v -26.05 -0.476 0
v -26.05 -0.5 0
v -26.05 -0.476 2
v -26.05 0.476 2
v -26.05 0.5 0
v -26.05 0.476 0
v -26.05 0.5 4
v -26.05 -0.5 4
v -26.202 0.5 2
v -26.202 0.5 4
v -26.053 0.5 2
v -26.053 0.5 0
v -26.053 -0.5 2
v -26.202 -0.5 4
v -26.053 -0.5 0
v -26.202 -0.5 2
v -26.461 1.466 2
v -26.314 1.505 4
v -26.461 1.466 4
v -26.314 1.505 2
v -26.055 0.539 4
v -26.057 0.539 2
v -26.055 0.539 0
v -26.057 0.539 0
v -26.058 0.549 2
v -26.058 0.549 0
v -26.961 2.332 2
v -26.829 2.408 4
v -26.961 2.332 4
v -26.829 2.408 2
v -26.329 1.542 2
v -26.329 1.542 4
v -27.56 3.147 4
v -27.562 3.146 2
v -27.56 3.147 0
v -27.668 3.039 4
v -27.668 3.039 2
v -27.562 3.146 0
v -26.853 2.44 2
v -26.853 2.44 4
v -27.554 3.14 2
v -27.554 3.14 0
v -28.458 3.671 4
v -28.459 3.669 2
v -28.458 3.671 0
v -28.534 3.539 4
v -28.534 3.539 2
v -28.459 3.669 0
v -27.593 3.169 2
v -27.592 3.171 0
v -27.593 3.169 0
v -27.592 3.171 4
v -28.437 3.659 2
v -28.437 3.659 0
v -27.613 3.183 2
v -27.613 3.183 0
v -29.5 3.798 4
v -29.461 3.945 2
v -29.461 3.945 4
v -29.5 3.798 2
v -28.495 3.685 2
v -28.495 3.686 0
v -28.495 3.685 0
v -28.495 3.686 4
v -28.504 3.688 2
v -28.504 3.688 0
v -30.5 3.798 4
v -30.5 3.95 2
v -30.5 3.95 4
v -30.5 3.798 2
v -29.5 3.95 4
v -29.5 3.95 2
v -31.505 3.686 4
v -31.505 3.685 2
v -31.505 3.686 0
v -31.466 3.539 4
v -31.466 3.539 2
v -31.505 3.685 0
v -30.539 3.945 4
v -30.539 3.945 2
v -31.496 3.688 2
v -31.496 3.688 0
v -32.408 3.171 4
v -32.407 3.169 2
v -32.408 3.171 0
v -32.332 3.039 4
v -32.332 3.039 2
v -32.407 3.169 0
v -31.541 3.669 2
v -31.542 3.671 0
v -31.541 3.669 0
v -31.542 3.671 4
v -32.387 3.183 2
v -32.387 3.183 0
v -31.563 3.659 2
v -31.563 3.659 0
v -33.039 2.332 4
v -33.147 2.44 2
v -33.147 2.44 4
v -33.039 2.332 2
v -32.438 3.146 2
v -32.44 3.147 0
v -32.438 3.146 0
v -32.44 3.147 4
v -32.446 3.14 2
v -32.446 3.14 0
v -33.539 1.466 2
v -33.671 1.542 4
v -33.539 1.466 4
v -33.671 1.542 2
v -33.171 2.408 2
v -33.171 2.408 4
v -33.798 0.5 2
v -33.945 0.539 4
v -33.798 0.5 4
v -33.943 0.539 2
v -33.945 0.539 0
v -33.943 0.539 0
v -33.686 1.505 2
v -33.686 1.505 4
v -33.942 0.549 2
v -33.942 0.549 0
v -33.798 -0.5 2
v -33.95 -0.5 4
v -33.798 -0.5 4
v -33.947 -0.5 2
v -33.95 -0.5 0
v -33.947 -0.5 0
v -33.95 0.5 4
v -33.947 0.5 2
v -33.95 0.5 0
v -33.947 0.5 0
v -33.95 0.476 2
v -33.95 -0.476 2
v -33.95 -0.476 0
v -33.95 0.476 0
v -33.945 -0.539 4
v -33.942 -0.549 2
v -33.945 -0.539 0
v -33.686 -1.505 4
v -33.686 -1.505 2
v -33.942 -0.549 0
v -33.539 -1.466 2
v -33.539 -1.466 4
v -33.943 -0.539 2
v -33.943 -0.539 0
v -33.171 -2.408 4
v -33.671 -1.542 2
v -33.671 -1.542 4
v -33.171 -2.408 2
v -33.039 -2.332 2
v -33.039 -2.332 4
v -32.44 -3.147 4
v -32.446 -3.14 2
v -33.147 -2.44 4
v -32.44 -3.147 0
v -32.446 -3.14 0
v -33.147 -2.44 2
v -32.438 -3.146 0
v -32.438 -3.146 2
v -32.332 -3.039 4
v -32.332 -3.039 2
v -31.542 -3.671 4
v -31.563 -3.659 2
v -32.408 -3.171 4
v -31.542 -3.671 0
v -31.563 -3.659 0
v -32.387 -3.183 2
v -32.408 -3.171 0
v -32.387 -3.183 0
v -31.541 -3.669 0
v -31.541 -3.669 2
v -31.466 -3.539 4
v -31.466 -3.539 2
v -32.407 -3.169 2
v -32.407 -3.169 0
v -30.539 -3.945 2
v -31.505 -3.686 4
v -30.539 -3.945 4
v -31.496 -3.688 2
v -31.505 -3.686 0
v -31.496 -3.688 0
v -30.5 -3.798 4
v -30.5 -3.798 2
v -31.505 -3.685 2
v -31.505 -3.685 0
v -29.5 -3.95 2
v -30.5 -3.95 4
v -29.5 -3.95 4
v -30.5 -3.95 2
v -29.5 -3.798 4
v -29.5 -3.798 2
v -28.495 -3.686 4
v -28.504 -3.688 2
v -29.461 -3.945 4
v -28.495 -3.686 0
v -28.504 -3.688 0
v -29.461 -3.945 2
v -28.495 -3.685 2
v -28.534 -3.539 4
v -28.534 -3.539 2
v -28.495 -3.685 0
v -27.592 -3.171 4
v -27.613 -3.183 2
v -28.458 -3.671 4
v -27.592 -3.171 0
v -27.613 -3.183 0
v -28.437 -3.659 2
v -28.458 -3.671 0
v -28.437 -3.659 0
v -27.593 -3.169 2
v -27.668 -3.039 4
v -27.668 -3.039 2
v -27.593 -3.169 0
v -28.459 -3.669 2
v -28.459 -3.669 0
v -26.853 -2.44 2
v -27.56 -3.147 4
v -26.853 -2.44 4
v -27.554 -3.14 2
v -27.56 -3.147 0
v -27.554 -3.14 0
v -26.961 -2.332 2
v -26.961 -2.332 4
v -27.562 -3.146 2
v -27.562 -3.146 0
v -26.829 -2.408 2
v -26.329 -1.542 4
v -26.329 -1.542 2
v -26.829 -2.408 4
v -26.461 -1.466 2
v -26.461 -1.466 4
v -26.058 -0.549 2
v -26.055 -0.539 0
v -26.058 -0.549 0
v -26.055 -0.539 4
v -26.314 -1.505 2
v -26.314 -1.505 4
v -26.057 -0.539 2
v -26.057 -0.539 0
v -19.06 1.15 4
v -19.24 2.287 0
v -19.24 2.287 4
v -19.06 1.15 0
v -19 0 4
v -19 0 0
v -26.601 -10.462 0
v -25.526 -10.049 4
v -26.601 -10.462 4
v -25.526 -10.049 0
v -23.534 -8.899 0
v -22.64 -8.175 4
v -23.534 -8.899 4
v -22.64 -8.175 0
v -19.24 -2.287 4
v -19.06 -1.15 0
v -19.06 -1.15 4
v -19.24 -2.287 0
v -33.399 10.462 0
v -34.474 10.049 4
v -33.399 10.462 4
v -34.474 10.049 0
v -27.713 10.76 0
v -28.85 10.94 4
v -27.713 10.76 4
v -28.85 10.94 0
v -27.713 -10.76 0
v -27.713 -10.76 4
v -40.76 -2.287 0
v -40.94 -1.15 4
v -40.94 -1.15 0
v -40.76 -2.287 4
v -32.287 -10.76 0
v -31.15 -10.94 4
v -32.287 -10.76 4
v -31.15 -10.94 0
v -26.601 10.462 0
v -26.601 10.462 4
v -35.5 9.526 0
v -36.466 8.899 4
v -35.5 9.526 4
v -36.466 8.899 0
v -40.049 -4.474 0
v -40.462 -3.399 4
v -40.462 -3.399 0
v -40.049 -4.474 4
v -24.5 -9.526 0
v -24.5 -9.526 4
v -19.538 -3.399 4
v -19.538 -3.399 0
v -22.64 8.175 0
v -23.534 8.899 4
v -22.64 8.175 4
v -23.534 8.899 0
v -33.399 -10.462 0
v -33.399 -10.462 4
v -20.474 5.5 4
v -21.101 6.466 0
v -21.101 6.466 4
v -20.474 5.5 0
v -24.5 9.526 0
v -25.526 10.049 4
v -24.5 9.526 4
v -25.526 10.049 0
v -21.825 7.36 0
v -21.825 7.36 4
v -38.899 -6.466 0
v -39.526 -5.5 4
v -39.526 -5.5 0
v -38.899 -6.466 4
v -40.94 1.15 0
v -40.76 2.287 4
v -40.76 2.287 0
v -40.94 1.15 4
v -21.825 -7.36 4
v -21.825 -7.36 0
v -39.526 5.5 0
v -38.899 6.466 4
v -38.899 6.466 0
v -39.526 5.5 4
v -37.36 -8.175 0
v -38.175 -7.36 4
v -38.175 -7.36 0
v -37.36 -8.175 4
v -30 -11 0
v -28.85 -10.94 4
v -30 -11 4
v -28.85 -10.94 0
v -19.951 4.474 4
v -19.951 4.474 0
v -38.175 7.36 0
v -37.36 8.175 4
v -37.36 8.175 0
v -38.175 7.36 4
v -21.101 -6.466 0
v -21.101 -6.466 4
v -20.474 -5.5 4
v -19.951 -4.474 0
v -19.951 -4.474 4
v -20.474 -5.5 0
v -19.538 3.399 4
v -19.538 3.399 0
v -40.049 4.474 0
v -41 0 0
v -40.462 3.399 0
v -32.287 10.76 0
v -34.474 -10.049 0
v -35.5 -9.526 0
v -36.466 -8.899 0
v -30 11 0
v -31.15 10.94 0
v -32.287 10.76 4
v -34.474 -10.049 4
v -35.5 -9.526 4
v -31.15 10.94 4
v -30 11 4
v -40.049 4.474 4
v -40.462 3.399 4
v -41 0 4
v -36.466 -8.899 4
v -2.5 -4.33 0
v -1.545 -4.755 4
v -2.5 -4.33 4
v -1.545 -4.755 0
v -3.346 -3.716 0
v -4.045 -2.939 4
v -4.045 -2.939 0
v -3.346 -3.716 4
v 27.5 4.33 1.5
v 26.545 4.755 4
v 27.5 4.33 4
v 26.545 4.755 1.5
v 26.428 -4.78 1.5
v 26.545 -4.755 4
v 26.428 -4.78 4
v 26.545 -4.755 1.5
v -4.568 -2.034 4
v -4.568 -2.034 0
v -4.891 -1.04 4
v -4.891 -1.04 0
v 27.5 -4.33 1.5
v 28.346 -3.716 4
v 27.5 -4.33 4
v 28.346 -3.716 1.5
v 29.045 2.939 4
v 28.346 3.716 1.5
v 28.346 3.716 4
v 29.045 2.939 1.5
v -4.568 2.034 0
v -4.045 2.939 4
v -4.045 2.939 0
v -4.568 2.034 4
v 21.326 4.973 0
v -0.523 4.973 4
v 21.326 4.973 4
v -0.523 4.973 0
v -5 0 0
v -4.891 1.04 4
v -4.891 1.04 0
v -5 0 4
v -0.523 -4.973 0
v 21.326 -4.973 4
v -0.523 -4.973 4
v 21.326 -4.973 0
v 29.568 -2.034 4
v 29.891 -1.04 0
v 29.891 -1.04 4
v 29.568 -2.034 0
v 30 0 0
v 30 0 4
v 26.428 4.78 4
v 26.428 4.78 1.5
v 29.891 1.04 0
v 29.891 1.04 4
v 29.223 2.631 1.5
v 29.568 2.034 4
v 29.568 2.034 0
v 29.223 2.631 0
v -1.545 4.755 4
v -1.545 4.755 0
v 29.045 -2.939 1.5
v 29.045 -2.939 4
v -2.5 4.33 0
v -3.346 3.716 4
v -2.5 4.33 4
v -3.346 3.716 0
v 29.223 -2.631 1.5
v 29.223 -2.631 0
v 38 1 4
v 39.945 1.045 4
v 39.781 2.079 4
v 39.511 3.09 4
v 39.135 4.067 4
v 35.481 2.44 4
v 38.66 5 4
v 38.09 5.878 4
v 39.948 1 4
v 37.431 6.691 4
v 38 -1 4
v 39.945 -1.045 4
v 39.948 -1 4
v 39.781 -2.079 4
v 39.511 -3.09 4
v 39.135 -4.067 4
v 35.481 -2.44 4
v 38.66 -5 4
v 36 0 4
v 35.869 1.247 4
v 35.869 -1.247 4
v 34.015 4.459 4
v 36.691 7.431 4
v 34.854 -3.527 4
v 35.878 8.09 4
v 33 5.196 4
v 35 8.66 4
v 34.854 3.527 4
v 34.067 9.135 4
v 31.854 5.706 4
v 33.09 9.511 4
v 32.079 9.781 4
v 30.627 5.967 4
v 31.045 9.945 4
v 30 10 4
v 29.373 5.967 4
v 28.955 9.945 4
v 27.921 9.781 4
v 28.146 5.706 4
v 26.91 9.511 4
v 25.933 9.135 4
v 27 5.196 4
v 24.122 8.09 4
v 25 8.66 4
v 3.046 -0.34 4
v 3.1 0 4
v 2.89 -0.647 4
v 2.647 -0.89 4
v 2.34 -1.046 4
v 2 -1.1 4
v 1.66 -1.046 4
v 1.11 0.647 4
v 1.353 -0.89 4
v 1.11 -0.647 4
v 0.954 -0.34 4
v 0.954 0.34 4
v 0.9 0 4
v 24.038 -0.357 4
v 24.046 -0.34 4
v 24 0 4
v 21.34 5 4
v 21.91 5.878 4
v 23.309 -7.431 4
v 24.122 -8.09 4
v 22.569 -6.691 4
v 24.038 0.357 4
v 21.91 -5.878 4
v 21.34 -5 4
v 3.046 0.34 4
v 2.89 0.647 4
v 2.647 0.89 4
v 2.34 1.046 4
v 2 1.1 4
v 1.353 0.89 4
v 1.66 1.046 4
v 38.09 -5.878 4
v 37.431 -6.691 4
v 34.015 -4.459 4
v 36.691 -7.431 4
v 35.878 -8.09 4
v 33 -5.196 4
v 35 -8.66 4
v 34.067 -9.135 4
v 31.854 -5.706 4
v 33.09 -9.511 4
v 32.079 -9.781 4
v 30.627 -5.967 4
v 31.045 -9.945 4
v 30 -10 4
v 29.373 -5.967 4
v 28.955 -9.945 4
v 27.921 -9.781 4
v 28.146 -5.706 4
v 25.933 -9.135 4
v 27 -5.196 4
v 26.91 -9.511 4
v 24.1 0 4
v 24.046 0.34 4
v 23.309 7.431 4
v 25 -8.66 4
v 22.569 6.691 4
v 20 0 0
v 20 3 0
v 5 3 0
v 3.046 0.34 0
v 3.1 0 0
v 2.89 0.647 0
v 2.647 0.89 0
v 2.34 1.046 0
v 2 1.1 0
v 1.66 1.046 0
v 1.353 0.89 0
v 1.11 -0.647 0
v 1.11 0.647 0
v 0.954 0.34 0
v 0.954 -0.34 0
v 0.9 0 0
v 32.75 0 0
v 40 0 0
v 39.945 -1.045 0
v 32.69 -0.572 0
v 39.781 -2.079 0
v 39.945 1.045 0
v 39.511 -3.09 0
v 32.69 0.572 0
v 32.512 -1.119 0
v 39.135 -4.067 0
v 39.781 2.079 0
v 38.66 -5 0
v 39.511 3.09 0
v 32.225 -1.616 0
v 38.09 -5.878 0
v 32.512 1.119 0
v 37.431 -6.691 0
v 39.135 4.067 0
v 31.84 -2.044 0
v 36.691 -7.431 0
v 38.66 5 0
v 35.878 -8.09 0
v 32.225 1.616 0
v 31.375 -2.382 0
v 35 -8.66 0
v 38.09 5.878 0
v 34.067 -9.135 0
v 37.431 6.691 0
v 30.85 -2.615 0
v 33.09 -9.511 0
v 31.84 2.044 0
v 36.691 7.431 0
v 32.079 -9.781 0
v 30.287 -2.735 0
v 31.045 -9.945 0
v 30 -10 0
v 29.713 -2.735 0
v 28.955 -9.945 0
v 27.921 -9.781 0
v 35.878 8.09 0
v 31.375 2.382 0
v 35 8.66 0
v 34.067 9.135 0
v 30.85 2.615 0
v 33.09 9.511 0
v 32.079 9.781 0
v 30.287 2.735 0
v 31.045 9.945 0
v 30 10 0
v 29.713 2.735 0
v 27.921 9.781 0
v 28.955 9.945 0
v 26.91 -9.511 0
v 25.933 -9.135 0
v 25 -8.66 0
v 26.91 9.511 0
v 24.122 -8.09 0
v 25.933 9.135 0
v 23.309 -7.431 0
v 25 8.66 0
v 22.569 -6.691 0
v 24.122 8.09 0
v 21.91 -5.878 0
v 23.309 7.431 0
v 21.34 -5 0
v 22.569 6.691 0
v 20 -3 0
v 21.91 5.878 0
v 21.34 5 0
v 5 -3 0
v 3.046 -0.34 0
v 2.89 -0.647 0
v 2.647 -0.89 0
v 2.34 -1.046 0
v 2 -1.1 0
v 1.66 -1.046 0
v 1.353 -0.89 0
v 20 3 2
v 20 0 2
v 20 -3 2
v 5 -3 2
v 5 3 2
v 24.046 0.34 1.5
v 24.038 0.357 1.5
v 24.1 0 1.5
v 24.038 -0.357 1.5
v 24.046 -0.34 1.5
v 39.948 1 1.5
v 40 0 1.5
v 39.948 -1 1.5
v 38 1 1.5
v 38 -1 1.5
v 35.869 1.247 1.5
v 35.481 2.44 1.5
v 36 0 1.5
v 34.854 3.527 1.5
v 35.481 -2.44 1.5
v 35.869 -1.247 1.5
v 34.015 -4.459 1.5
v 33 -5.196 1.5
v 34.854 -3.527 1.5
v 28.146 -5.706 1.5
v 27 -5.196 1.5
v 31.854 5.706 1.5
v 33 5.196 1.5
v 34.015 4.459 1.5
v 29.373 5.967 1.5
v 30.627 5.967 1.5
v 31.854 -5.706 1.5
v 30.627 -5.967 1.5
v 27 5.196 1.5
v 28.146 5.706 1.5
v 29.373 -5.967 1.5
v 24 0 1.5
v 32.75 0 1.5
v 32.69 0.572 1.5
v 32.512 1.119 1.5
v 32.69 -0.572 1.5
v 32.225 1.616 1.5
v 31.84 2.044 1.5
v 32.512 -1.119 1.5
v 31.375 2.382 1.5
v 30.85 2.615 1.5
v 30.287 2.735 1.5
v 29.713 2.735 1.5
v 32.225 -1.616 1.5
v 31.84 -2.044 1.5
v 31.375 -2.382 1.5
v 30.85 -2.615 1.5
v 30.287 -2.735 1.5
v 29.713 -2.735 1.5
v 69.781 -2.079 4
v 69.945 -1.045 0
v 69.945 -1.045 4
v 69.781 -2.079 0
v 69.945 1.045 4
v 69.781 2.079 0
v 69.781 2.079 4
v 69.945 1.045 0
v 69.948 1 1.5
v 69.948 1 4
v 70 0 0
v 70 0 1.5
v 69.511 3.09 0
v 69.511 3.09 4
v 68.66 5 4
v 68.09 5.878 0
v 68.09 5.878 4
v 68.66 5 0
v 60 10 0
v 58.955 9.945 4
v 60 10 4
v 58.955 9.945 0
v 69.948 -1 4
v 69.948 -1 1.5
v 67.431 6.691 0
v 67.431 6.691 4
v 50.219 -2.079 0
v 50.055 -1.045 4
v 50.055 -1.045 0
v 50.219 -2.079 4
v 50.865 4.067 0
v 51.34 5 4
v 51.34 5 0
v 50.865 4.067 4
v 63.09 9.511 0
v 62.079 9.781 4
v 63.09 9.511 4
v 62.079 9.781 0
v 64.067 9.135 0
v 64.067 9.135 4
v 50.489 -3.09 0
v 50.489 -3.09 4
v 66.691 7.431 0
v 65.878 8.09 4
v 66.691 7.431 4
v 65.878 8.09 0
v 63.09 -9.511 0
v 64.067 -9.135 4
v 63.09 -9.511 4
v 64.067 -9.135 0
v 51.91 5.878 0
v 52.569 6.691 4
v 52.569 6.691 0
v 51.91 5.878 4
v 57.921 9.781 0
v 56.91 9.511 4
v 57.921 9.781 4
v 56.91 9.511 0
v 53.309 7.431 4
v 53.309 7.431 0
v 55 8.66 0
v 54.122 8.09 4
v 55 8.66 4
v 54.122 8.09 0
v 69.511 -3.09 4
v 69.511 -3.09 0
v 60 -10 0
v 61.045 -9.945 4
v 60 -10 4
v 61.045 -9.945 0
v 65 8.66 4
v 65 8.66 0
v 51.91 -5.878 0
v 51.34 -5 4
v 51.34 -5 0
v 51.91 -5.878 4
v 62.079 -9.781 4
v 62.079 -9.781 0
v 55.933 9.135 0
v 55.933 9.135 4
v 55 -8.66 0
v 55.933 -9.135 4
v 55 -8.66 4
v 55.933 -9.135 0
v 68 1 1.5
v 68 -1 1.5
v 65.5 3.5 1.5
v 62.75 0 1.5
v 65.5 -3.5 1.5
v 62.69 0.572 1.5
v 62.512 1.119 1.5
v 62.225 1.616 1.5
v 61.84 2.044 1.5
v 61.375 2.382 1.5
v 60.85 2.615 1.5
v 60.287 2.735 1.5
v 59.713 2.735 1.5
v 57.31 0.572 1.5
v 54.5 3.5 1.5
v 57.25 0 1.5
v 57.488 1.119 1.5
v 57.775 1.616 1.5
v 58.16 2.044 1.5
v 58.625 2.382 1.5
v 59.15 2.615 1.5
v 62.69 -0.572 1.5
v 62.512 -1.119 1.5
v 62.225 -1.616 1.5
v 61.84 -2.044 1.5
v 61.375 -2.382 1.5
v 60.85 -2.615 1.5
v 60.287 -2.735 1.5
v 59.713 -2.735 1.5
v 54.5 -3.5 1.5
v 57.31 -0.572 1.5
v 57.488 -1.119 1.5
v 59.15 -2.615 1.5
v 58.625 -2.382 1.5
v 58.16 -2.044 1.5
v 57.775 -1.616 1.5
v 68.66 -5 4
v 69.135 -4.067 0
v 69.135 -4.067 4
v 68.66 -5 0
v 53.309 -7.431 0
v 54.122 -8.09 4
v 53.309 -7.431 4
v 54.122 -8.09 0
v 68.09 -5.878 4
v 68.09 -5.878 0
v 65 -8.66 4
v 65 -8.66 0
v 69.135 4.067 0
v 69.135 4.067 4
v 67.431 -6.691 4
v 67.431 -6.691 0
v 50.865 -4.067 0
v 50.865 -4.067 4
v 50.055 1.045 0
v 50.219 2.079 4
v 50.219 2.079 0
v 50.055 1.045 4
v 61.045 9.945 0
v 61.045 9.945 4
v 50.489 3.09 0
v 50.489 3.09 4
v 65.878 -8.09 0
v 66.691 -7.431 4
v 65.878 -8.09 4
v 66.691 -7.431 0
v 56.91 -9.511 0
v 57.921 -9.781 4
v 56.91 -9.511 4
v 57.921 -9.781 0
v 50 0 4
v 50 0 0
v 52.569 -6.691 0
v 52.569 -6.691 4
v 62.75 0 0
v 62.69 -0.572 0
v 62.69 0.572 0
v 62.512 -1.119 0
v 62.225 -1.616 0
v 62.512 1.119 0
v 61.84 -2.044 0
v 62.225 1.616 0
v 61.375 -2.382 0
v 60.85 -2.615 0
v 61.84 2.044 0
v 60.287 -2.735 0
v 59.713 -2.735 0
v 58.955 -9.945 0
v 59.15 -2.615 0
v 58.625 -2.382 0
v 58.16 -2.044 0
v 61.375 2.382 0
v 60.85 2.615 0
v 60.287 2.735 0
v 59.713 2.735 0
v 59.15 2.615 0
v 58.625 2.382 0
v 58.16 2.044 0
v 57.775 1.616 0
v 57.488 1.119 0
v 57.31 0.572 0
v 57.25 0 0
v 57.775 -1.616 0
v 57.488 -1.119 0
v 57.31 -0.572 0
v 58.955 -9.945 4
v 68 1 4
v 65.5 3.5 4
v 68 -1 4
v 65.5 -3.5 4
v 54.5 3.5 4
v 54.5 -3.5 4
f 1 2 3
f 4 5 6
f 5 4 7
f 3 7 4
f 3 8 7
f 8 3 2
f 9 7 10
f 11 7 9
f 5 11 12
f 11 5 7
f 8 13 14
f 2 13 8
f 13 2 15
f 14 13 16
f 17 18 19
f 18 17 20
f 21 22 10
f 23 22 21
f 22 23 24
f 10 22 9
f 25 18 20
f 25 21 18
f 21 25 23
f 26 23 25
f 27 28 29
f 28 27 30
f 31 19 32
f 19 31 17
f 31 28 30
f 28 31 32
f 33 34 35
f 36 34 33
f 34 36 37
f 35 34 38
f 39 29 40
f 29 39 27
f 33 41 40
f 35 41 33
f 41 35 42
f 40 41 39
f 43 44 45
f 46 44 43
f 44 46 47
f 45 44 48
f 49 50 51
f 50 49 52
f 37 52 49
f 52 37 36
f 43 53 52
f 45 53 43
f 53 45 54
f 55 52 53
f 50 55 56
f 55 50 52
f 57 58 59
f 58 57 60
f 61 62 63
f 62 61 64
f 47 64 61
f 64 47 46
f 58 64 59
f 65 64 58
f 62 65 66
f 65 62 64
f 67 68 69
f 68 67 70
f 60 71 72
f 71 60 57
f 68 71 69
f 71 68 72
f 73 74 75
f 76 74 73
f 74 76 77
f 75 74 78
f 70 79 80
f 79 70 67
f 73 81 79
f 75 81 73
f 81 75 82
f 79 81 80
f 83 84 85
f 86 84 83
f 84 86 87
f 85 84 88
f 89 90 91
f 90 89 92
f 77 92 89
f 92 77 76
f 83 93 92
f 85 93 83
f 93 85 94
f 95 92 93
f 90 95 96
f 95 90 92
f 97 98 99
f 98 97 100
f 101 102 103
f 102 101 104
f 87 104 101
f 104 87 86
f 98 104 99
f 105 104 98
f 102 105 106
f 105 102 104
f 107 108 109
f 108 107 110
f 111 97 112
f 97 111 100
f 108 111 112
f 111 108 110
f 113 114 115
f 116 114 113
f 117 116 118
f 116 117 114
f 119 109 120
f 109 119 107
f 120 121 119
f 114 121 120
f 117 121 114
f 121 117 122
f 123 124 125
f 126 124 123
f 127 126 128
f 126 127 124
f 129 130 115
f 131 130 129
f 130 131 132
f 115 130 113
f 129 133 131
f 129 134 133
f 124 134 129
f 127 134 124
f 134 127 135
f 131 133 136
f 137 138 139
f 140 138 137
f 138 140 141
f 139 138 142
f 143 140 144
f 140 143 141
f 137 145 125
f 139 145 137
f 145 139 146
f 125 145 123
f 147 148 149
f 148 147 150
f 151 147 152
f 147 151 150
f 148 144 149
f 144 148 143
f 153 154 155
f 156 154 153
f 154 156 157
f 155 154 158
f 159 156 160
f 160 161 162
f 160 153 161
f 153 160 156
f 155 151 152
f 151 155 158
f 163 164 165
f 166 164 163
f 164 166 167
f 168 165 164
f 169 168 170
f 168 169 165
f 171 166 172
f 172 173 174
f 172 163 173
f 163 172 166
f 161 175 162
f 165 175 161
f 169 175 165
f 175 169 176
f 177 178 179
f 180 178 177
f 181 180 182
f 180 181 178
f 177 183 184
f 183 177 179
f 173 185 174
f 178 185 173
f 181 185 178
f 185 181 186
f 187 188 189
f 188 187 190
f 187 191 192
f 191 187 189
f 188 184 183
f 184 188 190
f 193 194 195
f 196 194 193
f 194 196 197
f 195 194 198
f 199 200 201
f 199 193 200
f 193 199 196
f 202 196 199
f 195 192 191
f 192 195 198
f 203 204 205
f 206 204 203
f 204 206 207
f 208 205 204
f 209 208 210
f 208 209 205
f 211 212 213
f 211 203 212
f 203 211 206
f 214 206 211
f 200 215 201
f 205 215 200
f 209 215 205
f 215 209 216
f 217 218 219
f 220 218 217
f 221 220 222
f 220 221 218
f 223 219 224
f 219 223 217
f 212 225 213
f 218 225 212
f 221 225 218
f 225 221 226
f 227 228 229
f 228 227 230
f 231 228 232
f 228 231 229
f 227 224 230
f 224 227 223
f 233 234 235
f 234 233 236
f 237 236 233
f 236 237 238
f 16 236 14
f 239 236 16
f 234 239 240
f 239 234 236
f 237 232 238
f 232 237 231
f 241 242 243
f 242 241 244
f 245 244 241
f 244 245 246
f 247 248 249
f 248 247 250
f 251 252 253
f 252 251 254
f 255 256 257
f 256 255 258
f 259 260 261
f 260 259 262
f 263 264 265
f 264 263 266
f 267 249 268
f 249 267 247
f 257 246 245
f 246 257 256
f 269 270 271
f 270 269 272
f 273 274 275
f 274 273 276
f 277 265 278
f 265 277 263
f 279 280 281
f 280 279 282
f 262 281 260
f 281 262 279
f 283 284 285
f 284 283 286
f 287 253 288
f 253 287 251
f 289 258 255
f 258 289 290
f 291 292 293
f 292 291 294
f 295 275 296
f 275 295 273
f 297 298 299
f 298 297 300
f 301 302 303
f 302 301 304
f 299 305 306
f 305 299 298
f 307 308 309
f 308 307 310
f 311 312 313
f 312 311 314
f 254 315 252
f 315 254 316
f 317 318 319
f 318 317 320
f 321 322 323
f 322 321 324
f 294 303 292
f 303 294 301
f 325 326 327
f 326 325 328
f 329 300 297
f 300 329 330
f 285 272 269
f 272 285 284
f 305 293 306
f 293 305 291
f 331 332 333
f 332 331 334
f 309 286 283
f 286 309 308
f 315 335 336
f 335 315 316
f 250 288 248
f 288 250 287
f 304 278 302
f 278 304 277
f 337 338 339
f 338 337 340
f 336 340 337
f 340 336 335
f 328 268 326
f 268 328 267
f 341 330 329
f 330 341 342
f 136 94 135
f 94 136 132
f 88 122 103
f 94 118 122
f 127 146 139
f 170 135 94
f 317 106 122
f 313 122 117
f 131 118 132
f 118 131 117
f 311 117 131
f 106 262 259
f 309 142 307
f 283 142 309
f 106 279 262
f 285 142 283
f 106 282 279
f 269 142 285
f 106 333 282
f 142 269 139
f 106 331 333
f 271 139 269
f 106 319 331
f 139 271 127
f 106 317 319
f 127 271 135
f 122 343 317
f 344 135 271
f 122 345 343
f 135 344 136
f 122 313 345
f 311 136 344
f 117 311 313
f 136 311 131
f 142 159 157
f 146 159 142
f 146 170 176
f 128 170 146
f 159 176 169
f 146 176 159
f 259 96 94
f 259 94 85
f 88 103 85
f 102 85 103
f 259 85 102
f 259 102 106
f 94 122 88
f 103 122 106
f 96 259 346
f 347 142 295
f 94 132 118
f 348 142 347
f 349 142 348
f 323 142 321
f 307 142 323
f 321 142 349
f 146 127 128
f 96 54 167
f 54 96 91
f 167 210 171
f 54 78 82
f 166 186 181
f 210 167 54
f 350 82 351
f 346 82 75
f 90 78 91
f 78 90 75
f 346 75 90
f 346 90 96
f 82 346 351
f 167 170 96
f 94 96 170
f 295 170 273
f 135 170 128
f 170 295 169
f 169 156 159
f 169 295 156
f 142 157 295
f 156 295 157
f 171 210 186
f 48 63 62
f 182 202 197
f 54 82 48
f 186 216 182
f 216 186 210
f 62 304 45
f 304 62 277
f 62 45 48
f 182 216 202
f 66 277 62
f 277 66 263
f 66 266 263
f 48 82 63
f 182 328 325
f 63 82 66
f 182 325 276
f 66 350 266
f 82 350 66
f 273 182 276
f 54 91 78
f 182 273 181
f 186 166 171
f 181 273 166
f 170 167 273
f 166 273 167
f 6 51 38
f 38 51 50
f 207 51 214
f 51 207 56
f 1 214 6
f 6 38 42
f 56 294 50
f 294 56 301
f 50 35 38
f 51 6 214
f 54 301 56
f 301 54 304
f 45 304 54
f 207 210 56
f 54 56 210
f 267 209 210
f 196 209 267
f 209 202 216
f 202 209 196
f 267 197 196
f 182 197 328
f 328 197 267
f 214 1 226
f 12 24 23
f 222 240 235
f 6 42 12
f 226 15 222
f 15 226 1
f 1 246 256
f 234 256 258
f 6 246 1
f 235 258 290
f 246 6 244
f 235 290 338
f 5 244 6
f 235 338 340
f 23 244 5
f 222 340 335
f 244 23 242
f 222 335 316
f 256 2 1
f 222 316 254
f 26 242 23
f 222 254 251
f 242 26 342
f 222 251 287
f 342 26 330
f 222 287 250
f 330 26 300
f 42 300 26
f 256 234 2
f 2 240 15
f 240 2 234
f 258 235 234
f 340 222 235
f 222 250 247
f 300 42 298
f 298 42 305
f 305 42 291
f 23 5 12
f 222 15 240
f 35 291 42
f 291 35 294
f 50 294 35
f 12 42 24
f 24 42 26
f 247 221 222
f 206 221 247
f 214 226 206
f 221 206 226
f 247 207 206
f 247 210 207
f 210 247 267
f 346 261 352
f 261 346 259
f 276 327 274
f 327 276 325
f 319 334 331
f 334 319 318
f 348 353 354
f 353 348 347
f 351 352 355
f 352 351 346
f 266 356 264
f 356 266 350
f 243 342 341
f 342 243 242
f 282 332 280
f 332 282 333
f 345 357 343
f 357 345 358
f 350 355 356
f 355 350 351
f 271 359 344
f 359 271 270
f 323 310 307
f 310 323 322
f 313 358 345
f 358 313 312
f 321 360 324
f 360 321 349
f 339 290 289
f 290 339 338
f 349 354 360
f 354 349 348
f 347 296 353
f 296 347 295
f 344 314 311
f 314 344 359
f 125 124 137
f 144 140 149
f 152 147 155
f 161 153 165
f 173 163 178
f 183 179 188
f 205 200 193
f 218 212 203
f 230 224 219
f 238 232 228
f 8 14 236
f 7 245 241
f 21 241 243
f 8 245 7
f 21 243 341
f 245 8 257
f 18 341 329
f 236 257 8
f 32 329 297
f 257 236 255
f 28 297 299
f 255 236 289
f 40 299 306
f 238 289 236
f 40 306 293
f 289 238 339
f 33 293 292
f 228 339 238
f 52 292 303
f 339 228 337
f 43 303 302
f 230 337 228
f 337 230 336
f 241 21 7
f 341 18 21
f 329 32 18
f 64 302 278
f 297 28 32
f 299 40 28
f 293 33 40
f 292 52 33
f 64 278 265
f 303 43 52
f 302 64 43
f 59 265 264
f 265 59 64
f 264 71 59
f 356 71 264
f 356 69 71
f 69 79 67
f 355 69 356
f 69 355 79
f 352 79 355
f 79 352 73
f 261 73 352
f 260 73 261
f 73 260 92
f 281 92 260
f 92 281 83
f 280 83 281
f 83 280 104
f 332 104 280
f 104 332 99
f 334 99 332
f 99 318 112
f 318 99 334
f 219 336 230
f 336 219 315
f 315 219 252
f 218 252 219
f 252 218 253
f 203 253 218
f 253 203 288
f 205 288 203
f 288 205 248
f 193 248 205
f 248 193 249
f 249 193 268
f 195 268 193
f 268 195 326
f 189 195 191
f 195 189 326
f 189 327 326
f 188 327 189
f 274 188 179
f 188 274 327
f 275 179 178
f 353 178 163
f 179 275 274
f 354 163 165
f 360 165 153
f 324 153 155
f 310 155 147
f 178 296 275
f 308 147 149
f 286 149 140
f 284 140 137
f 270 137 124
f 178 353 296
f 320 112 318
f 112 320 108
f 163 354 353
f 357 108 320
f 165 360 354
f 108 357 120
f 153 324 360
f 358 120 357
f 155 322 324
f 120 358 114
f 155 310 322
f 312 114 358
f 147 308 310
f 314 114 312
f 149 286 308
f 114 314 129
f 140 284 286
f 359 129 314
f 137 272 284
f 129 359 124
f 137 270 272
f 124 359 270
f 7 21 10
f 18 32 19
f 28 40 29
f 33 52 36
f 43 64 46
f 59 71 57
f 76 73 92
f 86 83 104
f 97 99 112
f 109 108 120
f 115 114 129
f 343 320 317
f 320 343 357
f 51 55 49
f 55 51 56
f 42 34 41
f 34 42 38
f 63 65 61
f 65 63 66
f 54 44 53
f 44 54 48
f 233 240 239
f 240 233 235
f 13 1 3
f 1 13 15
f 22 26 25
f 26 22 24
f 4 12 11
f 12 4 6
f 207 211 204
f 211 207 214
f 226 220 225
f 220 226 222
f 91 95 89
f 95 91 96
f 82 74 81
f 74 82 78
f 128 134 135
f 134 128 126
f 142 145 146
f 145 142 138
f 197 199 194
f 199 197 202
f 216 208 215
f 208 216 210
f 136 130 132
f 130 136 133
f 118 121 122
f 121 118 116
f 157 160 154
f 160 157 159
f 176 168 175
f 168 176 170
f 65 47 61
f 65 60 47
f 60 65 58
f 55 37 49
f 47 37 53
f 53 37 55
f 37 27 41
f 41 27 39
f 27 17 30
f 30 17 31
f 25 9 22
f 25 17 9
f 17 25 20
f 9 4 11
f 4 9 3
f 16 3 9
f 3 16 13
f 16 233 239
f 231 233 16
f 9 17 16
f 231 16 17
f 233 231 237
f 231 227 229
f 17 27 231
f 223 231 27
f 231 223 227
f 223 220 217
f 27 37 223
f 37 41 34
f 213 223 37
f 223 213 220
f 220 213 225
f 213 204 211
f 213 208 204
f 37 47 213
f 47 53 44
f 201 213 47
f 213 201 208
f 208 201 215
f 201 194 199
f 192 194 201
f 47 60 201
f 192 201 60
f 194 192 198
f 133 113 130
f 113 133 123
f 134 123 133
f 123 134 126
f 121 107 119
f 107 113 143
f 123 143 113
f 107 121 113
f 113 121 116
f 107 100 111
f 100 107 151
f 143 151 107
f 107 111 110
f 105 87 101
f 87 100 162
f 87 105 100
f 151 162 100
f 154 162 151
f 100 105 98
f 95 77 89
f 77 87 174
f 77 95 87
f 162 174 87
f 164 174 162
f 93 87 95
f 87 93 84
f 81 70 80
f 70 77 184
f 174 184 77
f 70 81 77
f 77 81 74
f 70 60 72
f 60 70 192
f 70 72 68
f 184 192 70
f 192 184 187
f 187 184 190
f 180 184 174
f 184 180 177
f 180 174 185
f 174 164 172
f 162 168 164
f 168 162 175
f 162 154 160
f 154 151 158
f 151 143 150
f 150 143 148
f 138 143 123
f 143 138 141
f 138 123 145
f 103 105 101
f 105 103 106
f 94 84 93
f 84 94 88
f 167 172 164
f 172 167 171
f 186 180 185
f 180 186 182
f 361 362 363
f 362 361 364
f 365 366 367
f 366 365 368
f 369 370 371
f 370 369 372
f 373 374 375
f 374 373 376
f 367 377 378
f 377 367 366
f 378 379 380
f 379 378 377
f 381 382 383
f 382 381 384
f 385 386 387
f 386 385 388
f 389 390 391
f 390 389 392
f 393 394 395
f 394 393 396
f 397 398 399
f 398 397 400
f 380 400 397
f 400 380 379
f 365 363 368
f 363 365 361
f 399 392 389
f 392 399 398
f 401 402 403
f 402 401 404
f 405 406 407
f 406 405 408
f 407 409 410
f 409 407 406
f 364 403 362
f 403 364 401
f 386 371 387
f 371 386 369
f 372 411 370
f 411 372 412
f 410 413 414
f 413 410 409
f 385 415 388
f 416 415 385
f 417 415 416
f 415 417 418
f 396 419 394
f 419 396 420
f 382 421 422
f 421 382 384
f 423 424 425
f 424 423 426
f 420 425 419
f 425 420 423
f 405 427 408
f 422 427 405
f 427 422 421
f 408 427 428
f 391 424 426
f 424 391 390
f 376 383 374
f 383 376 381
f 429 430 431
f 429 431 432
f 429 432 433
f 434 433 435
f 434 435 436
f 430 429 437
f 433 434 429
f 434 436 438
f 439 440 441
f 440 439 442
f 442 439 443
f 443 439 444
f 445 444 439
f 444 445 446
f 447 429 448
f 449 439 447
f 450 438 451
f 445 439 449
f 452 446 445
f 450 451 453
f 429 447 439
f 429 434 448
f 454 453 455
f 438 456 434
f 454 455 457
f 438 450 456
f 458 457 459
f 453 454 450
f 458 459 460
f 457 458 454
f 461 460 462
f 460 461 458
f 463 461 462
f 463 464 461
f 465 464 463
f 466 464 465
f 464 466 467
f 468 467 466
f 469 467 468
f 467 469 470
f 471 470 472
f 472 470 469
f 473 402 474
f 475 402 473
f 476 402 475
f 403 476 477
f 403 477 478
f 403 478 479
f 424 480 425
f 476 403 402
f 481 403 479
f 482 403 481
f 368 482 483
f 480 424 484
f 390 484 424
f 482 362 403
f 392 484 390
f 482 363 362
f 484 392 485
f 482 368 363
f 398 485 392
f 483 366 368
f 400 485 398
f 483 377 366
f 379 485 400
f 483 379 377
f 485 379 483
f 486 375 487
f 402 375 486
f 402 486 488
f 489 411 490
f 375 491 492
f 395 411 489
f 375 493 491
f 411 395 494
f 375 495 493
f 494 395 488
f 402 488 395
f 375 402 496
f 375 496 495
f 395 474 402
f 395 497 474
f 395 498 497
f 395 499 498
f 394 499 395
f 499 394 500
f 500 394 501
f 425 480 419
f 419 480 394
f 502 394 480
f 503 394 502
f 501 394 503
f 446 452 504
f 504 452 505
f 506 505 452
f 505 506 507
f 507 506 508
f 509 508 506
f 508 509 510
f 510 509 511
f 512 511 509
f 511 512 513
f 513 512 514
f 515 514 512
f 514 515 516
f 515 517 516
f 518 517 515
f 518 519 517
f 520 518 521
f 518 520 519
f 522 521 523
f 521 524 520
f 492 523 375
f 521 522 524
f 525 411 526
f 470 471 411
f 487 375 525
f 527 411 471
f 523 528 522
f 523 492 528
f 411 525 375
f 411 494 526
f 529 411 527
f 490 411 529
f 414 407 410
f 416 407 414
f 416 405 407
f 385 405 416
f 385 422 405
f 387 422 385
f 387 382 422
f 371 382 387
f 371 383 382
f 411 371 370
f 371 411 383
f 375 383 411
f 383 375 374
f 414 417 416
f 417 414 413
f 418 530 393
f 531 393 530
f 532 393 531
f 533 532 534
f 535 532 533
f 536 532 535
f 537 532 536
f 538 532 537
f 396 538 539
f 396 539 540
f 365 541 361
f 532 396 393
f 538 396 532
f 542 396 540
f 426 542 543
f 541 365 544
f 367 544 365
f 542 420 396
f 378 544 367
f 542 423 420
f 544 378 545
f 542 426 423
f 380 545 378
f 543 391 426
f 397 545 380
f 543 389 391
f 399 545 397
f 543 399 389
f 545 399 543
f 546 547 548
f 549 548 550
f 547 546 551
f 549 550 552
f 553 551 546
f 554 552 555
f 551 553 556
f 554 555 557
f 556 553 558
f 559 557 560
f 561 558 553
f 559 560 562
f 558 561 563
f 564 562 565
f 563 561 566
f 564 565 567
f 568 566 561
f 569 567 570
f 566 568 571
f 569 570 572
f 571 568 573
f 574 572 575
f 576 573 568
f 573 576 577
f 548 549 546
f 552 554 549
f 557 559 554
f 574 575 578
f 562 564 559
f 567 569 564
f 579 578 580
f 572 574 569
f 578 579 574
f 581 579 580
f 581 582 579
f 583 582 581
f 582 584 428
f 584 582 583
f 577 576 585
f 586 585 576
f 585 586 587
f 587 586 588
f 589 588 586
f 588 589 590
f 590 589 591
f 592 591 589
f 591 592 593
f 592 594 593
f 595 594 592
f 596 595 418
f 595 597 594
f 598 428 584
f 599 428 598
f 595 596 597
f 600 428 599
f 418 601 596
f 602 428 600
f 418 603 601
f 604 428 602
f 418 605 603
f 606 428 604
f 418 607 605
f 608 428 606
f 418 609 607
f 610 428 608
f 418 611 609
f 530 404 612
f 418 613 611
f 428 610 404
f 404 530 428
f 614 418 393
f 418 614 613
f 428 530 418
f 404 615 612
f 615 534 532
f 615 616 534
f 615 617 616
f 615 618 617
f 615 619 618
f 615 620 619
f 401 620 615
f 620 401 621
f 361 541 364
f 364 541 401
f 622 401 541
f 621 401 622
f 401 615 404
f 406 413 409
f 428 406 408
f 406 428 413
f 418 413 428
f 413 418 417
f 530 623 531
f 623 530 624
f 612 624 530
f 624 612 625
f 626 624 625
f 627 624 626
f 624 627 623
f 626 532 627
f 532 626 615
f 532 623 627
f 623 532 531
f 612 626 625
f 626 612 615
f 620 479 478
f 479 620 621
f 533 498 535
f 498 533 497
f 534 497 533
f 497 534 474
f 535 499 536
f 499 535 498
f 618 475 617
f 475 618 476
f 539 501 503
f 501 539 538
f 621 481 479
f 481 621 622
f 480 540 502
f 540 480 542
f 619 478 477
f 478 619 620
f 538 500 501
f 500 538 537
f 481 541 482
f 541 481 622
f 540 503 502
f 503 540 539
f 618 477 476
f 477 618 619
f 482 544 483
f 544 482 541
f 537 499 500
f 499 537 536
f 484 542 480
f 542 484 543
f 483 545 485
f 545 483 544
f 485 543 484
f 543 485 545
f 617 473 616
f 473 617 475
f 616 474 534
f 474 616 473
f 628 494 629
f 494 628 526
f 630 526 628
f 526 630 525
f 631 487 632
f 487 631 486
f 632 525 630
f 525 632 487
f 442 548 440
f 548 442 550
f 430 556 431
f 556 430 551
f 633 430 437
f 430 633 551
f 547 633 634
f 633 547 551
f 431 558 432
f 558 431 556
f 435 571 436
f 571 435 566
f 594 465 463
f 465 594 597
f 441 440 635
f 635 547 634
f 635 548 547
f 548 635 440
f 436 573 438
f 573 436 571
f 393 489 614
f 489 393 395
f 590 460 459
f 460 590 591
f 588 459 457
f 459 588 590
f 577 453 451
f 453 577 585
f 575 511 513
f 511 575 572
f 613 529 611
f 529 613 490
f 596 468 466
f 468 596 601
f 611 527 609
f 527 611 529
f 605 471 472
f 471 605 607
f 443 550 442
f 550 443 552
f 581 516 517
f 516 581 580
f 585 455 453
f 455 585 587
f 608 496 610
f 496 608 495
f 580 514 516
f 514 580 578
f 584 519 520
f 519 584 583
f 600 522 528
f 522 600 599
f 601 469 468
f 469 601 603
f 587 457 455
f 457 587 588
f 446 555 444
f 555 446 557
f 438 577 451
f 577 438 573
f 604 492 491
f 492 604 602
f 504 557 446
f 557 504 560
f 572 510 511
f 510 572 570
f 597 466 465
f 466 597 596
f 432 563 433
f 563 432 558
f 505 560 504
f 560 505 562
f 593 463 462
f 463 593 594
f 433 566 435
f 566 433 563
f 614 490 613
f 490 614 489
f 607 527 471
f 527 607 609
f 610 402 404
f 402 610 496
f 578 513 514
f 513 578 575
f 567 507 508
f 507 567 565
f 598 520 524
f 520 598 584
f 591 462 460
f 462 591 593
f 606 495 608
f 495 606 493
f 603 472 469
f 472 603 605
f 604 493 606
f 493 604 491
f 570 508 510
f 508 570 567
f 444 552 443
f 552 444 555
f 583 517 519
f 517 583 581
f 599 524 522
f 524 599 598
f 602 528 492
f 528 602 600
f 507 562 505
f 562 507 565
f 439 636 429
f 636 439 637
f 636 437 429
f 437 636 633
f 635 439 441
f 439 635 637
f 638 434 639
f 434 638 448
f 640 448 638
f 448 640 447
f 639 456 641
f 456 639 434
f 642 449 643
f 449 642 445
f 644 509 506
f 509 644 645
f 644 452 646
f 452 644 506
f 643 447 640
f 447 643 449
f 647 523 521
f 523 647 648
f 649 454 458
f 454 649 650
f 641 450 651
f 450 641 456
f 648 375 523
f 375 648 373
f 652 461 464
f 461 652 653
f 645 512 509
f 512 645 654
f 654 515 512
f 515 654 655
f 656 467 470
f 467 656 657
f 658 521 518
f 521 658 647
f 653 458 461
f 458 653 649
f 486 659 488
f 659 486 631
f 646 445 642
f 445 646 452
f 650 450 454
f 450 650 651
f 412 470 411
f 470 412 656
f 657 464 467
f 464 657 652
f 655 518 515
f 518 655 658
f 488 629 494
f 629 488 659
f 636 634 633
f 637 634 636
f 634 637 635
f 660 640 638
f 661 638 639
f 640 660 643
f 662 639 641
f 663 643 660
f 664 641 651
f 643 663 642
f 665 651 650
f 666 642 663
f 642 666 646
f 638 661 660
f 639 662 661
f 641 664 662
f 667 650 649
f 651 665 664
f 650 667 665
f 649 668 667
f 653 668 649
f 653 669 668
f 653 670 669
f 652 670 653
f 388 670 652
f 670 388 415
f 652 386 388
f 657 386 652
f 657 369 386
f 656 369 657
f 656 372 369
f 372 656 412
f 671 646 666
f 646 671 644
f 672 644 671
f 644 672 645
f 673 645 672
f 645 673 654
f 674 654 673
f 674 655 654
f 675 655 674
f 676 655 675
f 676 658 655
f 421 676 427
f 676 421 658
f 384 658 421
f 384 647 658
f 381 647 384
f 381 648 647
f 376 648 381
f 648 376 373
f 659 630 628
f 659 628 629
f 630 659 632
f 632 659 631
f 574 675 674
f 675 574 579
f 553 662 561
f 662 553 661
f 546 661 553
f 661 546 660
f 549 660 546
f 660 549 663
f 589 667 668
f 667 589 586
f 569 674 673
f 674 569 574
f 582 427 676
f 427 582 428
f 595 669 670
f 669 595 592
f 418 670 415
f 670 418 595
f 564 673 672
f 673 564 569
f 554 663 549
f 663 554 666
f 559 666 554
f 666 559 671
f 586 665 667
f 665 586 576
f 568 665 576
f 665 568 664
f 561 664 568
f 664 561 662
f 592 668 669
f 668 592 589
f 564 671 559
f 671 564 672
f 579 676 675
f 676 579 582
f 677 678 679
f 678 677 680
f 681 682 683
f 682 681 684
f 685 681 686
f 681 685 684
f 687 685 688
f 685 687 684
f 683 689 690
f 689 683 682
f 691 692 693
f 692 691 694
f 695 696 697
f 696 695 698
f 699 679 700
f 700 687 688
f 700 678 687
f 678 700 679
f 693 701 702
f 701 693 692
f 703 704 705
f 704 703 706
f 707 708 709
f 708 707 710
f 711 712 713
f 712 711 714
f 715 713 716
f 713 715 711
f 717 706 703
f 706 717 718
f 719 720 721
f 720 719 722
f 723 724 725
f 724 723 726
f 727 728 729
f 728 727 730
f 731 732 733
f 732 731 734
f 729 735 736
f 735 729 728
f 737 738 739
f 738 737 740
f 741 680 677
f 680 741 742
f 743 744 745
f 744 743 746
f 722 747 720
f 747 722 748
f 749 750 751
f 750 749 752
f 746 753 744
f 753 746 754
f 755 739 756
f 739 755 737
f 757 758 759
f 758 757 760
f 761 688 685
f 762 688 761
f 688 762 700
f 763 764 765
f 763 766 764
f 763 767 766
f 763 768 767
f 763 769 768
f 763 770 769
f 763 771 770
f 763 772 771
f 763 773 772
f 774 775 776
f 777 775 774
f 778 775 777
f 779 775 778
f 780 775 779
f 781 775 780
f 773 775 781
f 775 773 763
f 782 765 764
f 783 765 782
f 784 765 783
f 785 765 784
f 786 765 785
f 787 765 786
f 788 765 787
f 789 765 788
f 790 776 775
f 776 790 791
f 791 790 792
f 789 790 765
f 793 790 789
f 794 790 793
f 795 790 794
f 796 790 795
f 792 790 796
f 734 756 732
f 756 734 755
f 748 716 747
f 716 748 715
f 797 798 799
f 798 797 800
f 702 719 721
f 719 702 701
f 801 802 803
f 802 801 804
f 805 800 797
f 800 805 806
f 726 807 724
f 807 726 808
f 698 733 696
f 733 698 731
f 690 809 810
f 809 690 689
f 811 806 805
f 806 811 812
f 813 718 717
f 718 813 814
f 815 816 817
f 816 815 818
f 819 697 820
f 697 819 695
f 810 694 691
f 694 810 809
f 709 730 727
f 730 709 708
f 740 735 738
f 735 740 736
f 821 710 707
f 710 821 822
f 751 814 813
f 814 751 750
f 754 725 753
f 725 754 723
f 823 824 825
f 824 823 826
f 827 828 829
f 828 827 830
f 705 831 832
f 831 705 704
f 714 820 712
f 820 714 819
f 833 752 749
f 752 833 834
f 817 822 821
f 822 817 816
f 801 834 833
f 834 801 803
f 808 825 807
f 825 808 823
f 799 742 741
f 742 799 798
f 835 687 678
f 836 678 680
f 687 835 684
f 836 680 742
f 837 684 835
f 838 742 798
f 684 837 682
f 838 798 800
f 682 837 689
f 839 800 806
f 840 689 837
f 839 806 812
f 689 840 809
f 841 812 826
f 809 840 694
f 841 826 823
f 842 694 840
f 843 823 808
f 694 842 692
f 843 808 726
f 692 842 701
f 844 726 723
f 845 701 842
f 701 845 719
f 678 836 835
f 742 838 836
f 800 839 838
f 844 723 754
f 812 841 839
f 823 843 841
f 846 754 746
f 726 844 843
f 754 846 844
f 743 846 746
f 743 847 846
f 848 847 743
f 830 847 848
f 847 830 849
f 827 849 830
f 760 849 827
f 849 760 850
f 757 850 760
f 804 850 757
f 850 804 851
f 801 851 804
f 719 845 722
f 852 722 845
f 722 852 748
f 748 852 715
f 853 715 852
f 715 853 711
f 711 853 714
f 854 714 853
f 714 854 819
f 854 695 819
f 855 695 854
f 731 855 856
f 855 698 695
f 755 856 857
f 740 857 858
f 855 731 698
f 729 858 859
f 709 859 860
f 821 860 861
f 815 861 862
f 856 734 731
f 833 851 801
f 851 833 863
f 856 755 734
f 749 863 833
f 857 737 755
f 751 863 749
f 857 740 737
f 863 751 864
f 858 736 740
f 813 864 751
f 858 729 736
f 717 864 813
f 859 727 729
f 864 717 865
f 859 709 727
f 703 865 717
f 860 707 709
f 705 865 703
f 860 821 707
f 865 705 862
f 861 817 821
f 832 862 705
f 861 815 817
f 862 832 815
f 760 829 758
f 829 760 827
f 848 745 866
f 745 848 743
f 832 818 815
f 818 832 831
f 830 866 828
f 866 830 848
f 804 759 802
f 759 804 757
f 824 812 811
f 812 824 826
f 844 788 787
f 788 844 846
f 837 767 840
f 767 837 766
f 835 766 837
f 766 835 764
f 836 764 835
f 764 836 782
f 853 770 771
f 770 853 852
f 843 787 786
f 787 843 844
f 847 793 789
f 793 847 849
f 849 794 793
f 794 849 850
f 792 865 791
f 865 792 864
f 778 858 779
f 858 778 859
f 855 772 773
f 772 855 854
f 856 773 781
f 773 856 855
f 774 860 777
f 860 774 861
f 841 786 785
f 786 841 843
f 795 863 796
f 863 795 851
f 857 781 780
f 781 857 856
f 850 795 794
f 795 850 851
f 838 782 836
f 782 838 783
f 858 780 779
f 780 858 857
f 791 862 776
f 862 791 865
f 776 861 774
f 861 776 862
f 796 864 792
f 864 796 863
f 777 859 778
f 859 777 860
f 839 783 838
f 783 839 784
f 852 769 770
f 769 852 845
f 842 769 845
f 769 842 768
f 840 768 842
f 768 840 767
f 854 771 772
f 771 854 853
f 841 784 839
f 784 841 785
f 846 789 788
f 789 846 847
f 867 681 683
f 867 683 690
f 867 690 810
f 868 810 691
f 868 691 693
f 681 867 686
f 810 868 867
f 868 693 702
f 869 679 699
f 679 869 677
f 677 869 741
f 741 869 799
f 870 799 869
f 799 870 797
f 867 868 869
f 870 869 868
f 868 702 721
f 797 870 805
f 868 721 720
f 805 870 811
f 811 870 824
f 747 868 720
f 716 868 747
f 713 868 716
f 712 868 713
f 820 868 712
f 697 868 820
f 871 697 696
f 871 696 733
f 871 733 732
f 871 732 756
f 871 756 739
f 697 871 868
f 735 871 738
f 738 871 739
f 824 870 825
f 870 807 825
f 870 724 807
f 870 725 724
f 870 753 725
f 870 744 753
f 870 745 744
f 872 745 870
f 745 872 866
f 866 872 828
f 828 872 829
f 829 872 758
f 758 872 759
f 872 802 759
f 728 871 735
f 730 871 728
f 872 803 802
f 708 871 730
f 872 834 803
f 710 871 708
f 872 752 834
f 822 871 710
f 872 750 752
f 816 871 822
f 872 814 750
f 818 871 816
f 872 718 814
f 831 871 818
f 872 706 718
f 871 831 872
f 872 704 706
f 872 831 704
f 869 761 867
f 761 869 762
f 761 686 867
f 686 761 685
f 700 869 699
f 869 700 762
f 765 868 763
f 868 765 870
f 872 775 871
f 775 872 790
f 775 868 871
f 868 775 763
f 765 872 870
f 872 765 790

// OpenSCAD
// microbit-smartlock-servo-holder.scad
// Magnetic coupling servo holder for MG90S servo
// Micro:bit Smart Lock Project
//
// Usage: 
// 1. Open in OpenSCAD (https://www.openscad.org/)
// 2. Adjust parameters below for your lock
// 3. Press F5 to preview, F6 to render
// 4. Export as STL for 3D printing

// ==================== PARAMETERS ====================
// Adjust these values for your specific lock

// Magnet specifications (Neodymium N52 recommended)
magnet_diameter = 6.5;  // mm (0.5mm clearance for 6mm magnet)
magnet_thickness = 3;   // mm
magnet_housing_depth = 3.5; // mm (slightly less than magnet thickness for tight fit)

// Servo specifications (MG90S / SG90)
servo_spline_diameter = 5.5;  // mm (MG90S spline size)
servo_spline_teeth = 24;      // Number of spline teeth
servo_mount_thickness = 4;    // mm (base plate thickness)

// Arm specifications
arm_length = 25;      // mm (servo to thumb-turn distance)
arm_width = 10;       // mm
arm_thickness = 4;    // mm

// Thumb-turn grip specifications (ADJUST FOR YOUR LOCK!)
thumb_turn_width = 10;   // mm (measure your lock)
thumb_turn_height = 6;   // mm (measure your lock)
grip_clearance = 1;      // mm (gap between grip and thumb-turn)

// Print settings
print_nozzle = 0.4;  // mm (for wall thickness optimization)
layer_height = 0.2;  // mm

// ==================== MODULES ====================

// MG90S servo spline mount
module servo_spline_mount() {
    difference() {
        // Base disk
        cylinder(h = servo_mount_thickness, d = 22, $fn = 60);
        
        // Spline hole (24 teeth for MG90S)
        cylinder(h = servo_mount_thickness + 2, d = servo_spline_diameter, $fn = 60);
        
        // Spline teeth cutout
        for(i = [0 : 360/servo_spline_teeth : 359]) {
            rotate([0, 0, i])
            translate([servo_spline_diameter/2 - 0.3, -0.5, -1])
            cube([1.5, 1, servo_mount_thickness + 4]);
        }
        
        // Mounting screw holes (optional, for M2 screws)
        for(i = [0, 120, 240]) {
            rotate([0, 0, i])
            translate([16, 0, -1])
            cylinder(h = servo_mount_thickness + 4, d = 2.2, $fn = 20);
        }
    }
    
    // Center post for alignment
    cylinder(h = 2, d = 8, $fn = 30);
}

// Magnet housing (servo side - rotating part)
module magnet_housing_servo() {
    difference() {
        // Main body
        cylinder(h = magnet_thickness + 1, d = 20, $fn = 60);
        
        // Magnet cavity
        cylinder(h = magnet_housing_depth, d = magnet_diameter, $fn = 30);
        
        // Polarity indicator (small notch)
        rotate([0, 0, 0])
        translate([8, -1, -1])
        cube([4, 2, magnet_housing_depth + 2]);
        
        // Weight reduction (optional)
        cylinder(h = magnet_thickness + 3, d = 12, $fn = 30);
    }
    
    // Rim to hold magnet in place
    difference() {
        cylinder(h = 1.5, d = 20, $fn = 60);
        cylinder(h = 2, d = magnet_diameter - 1, $fn = 30);
    }
}

// Magnet housing (thumb-turn side - fixed part)
module magnet_housing_thumbturn() {
    difference() {
        // Main body
        cylinder(h = magnet_thickness + 1, d = 20, $fn = 60);
        
        // Magnet cavity
        cylinder(h = magnet_housing_depth, d = magnet_diameter, $fn = 30);
        
        // Polarity indicator
        rotate([0, 0, 0])
        translate([8, -1, -1])
        cube([4, 2, magnet_housing_depth + 2]);
        
        // Thumb-turn grip slot (rectangular)
        translate([-(thumb_turn_width + grip_clearance)/2, 
                   -(thumb_turn_height + grip_clearance)/2, 
                   -2])
        cube([thumb_turn_width + grip_clearance, 
              thumb_turn_height + grip_clearance, 
              magnet_thickness + 4]);
    }
    
    // Rim to hold magnet
    difference() {
        cylinder(h = 1.5, d = 20, $fn = 60);
        cylinder(h = 2, d = magnet_diameter - 1, $fn = 30);
    }
    
    // Grip texture (ridges for better hold)
    for(i = [-5 : 2 : 5]) {
        translate([i, thumb_turn_height/2 + grip_clearance/2 + 1, 0])
        cube([0.5, 2, magnet_thickness + 1]);
    }
}

// Connection arm (connects servo to magnet housing)
module connection_arm() {
    length = arm_length;
    width = arm_width;
    thickness = arm_thickness;
    
    difference() {
        // Main arm body
        hull() {
            cylinder(h = thickness, d = width, $fn = 30);
            translate([length, 0, 0])
            cylinder(h = thickness, d = width, $fn = 30);
        }
        
        // Weight reduction slots
        translate([length/2, 0, -1])
        cube([length - 10, width - 4, thickness + 2], center = true);
        
        // Mounting holes (for M2 screws or servo horn screws)
        translate([2, 0, -1])
        cylinder(h = thickness + 4, d = 2.2, $fn = 20);
        
        translate([length - 2, 0, -1])
        cylinder(h = thickness + 4, d = 2.2, $fn = 20);
    }
}

// Complete assembly (for visualization)
module full_assembly() {
    // Servo mount at origin
    color("blue")
    servo_spline_mount();
    
    // Connection arm
    color("gray")
    translate([0, servo_mount_thickness/2, 0])
    rotate([90, 0, 0])
    connection_arm();
    
    // Servo-side magnet housing
    color("red")
    translate([arm_length, 0, servo_mount_thickness + magnet_thickness + 1])
    rotate([180, 0, 0])
    magnet_housing_servo();
    
    // Thumb-turn side magnet housing (showing separation)
    color("green")
    translate([arm_length + 15, 0, servo_mount_thickness + magnet_thickness + 1])
    rotate([180, 0, 0])
    magnet_housing_thumbturn();
    
    // Magnets (visualization only)
    color("silver")
    translate([arm_length, 0, servo_mount_thickness + 2])
    cylinder(h = magnet_thickness, d = magnet_diameter - 0.5, $fn = 30);
    
    color("silver")
    translate([arm_length + 15, 0, servo_mount_thickness + 2])
    cylinder(h = magnet_thickness, d = magnet_diameter - 0.5, $fn = 30);
}

// ==================== EXPORT OPTIONS ====================

// Uncomment ONE of the following lines to export:

// Full assembly (for visualization only - don't print this)
// full_assembly();

// Individual parts for printing:

// Servo mount
translate([-30, 0, 0])
servo_spline_mount();

// Connection arm
translate([0, 0, 0])
connection_arm();

// Magnet housing (servo side)
translate([30, 0, 0])
magnet_housing_servo();

// Magnet housing (thumb-turn side)
translate([60, 0, 0])
magnet_housing_thumbturn();

// ==================== NOTES ====================
/*
Printing Instructions:
1. Print all parts in PETG or PLA+ for durability
2. Use 100% infill for strength (especially the arm)
3. Orient flat side down for best bed adhesion
4. Support material not required for this design

Assembly Instructions:
1. Press magnets into housings (note polarity!)
2. Attach servo mount to MG90S servo horn
3. Connect arm to servo mount
4. Attach magnet housing to other end of arm
5. Position servo on door frame
6. Align thumb-turn housing with your lock
7. Test magnetic coupling (should slip when manually turned)

Safety Notes:
- Neodymium magnets are brittle - handle carefully
- Keep magnets away from electronics and credit cards
- Test manual override before final installation
*/
